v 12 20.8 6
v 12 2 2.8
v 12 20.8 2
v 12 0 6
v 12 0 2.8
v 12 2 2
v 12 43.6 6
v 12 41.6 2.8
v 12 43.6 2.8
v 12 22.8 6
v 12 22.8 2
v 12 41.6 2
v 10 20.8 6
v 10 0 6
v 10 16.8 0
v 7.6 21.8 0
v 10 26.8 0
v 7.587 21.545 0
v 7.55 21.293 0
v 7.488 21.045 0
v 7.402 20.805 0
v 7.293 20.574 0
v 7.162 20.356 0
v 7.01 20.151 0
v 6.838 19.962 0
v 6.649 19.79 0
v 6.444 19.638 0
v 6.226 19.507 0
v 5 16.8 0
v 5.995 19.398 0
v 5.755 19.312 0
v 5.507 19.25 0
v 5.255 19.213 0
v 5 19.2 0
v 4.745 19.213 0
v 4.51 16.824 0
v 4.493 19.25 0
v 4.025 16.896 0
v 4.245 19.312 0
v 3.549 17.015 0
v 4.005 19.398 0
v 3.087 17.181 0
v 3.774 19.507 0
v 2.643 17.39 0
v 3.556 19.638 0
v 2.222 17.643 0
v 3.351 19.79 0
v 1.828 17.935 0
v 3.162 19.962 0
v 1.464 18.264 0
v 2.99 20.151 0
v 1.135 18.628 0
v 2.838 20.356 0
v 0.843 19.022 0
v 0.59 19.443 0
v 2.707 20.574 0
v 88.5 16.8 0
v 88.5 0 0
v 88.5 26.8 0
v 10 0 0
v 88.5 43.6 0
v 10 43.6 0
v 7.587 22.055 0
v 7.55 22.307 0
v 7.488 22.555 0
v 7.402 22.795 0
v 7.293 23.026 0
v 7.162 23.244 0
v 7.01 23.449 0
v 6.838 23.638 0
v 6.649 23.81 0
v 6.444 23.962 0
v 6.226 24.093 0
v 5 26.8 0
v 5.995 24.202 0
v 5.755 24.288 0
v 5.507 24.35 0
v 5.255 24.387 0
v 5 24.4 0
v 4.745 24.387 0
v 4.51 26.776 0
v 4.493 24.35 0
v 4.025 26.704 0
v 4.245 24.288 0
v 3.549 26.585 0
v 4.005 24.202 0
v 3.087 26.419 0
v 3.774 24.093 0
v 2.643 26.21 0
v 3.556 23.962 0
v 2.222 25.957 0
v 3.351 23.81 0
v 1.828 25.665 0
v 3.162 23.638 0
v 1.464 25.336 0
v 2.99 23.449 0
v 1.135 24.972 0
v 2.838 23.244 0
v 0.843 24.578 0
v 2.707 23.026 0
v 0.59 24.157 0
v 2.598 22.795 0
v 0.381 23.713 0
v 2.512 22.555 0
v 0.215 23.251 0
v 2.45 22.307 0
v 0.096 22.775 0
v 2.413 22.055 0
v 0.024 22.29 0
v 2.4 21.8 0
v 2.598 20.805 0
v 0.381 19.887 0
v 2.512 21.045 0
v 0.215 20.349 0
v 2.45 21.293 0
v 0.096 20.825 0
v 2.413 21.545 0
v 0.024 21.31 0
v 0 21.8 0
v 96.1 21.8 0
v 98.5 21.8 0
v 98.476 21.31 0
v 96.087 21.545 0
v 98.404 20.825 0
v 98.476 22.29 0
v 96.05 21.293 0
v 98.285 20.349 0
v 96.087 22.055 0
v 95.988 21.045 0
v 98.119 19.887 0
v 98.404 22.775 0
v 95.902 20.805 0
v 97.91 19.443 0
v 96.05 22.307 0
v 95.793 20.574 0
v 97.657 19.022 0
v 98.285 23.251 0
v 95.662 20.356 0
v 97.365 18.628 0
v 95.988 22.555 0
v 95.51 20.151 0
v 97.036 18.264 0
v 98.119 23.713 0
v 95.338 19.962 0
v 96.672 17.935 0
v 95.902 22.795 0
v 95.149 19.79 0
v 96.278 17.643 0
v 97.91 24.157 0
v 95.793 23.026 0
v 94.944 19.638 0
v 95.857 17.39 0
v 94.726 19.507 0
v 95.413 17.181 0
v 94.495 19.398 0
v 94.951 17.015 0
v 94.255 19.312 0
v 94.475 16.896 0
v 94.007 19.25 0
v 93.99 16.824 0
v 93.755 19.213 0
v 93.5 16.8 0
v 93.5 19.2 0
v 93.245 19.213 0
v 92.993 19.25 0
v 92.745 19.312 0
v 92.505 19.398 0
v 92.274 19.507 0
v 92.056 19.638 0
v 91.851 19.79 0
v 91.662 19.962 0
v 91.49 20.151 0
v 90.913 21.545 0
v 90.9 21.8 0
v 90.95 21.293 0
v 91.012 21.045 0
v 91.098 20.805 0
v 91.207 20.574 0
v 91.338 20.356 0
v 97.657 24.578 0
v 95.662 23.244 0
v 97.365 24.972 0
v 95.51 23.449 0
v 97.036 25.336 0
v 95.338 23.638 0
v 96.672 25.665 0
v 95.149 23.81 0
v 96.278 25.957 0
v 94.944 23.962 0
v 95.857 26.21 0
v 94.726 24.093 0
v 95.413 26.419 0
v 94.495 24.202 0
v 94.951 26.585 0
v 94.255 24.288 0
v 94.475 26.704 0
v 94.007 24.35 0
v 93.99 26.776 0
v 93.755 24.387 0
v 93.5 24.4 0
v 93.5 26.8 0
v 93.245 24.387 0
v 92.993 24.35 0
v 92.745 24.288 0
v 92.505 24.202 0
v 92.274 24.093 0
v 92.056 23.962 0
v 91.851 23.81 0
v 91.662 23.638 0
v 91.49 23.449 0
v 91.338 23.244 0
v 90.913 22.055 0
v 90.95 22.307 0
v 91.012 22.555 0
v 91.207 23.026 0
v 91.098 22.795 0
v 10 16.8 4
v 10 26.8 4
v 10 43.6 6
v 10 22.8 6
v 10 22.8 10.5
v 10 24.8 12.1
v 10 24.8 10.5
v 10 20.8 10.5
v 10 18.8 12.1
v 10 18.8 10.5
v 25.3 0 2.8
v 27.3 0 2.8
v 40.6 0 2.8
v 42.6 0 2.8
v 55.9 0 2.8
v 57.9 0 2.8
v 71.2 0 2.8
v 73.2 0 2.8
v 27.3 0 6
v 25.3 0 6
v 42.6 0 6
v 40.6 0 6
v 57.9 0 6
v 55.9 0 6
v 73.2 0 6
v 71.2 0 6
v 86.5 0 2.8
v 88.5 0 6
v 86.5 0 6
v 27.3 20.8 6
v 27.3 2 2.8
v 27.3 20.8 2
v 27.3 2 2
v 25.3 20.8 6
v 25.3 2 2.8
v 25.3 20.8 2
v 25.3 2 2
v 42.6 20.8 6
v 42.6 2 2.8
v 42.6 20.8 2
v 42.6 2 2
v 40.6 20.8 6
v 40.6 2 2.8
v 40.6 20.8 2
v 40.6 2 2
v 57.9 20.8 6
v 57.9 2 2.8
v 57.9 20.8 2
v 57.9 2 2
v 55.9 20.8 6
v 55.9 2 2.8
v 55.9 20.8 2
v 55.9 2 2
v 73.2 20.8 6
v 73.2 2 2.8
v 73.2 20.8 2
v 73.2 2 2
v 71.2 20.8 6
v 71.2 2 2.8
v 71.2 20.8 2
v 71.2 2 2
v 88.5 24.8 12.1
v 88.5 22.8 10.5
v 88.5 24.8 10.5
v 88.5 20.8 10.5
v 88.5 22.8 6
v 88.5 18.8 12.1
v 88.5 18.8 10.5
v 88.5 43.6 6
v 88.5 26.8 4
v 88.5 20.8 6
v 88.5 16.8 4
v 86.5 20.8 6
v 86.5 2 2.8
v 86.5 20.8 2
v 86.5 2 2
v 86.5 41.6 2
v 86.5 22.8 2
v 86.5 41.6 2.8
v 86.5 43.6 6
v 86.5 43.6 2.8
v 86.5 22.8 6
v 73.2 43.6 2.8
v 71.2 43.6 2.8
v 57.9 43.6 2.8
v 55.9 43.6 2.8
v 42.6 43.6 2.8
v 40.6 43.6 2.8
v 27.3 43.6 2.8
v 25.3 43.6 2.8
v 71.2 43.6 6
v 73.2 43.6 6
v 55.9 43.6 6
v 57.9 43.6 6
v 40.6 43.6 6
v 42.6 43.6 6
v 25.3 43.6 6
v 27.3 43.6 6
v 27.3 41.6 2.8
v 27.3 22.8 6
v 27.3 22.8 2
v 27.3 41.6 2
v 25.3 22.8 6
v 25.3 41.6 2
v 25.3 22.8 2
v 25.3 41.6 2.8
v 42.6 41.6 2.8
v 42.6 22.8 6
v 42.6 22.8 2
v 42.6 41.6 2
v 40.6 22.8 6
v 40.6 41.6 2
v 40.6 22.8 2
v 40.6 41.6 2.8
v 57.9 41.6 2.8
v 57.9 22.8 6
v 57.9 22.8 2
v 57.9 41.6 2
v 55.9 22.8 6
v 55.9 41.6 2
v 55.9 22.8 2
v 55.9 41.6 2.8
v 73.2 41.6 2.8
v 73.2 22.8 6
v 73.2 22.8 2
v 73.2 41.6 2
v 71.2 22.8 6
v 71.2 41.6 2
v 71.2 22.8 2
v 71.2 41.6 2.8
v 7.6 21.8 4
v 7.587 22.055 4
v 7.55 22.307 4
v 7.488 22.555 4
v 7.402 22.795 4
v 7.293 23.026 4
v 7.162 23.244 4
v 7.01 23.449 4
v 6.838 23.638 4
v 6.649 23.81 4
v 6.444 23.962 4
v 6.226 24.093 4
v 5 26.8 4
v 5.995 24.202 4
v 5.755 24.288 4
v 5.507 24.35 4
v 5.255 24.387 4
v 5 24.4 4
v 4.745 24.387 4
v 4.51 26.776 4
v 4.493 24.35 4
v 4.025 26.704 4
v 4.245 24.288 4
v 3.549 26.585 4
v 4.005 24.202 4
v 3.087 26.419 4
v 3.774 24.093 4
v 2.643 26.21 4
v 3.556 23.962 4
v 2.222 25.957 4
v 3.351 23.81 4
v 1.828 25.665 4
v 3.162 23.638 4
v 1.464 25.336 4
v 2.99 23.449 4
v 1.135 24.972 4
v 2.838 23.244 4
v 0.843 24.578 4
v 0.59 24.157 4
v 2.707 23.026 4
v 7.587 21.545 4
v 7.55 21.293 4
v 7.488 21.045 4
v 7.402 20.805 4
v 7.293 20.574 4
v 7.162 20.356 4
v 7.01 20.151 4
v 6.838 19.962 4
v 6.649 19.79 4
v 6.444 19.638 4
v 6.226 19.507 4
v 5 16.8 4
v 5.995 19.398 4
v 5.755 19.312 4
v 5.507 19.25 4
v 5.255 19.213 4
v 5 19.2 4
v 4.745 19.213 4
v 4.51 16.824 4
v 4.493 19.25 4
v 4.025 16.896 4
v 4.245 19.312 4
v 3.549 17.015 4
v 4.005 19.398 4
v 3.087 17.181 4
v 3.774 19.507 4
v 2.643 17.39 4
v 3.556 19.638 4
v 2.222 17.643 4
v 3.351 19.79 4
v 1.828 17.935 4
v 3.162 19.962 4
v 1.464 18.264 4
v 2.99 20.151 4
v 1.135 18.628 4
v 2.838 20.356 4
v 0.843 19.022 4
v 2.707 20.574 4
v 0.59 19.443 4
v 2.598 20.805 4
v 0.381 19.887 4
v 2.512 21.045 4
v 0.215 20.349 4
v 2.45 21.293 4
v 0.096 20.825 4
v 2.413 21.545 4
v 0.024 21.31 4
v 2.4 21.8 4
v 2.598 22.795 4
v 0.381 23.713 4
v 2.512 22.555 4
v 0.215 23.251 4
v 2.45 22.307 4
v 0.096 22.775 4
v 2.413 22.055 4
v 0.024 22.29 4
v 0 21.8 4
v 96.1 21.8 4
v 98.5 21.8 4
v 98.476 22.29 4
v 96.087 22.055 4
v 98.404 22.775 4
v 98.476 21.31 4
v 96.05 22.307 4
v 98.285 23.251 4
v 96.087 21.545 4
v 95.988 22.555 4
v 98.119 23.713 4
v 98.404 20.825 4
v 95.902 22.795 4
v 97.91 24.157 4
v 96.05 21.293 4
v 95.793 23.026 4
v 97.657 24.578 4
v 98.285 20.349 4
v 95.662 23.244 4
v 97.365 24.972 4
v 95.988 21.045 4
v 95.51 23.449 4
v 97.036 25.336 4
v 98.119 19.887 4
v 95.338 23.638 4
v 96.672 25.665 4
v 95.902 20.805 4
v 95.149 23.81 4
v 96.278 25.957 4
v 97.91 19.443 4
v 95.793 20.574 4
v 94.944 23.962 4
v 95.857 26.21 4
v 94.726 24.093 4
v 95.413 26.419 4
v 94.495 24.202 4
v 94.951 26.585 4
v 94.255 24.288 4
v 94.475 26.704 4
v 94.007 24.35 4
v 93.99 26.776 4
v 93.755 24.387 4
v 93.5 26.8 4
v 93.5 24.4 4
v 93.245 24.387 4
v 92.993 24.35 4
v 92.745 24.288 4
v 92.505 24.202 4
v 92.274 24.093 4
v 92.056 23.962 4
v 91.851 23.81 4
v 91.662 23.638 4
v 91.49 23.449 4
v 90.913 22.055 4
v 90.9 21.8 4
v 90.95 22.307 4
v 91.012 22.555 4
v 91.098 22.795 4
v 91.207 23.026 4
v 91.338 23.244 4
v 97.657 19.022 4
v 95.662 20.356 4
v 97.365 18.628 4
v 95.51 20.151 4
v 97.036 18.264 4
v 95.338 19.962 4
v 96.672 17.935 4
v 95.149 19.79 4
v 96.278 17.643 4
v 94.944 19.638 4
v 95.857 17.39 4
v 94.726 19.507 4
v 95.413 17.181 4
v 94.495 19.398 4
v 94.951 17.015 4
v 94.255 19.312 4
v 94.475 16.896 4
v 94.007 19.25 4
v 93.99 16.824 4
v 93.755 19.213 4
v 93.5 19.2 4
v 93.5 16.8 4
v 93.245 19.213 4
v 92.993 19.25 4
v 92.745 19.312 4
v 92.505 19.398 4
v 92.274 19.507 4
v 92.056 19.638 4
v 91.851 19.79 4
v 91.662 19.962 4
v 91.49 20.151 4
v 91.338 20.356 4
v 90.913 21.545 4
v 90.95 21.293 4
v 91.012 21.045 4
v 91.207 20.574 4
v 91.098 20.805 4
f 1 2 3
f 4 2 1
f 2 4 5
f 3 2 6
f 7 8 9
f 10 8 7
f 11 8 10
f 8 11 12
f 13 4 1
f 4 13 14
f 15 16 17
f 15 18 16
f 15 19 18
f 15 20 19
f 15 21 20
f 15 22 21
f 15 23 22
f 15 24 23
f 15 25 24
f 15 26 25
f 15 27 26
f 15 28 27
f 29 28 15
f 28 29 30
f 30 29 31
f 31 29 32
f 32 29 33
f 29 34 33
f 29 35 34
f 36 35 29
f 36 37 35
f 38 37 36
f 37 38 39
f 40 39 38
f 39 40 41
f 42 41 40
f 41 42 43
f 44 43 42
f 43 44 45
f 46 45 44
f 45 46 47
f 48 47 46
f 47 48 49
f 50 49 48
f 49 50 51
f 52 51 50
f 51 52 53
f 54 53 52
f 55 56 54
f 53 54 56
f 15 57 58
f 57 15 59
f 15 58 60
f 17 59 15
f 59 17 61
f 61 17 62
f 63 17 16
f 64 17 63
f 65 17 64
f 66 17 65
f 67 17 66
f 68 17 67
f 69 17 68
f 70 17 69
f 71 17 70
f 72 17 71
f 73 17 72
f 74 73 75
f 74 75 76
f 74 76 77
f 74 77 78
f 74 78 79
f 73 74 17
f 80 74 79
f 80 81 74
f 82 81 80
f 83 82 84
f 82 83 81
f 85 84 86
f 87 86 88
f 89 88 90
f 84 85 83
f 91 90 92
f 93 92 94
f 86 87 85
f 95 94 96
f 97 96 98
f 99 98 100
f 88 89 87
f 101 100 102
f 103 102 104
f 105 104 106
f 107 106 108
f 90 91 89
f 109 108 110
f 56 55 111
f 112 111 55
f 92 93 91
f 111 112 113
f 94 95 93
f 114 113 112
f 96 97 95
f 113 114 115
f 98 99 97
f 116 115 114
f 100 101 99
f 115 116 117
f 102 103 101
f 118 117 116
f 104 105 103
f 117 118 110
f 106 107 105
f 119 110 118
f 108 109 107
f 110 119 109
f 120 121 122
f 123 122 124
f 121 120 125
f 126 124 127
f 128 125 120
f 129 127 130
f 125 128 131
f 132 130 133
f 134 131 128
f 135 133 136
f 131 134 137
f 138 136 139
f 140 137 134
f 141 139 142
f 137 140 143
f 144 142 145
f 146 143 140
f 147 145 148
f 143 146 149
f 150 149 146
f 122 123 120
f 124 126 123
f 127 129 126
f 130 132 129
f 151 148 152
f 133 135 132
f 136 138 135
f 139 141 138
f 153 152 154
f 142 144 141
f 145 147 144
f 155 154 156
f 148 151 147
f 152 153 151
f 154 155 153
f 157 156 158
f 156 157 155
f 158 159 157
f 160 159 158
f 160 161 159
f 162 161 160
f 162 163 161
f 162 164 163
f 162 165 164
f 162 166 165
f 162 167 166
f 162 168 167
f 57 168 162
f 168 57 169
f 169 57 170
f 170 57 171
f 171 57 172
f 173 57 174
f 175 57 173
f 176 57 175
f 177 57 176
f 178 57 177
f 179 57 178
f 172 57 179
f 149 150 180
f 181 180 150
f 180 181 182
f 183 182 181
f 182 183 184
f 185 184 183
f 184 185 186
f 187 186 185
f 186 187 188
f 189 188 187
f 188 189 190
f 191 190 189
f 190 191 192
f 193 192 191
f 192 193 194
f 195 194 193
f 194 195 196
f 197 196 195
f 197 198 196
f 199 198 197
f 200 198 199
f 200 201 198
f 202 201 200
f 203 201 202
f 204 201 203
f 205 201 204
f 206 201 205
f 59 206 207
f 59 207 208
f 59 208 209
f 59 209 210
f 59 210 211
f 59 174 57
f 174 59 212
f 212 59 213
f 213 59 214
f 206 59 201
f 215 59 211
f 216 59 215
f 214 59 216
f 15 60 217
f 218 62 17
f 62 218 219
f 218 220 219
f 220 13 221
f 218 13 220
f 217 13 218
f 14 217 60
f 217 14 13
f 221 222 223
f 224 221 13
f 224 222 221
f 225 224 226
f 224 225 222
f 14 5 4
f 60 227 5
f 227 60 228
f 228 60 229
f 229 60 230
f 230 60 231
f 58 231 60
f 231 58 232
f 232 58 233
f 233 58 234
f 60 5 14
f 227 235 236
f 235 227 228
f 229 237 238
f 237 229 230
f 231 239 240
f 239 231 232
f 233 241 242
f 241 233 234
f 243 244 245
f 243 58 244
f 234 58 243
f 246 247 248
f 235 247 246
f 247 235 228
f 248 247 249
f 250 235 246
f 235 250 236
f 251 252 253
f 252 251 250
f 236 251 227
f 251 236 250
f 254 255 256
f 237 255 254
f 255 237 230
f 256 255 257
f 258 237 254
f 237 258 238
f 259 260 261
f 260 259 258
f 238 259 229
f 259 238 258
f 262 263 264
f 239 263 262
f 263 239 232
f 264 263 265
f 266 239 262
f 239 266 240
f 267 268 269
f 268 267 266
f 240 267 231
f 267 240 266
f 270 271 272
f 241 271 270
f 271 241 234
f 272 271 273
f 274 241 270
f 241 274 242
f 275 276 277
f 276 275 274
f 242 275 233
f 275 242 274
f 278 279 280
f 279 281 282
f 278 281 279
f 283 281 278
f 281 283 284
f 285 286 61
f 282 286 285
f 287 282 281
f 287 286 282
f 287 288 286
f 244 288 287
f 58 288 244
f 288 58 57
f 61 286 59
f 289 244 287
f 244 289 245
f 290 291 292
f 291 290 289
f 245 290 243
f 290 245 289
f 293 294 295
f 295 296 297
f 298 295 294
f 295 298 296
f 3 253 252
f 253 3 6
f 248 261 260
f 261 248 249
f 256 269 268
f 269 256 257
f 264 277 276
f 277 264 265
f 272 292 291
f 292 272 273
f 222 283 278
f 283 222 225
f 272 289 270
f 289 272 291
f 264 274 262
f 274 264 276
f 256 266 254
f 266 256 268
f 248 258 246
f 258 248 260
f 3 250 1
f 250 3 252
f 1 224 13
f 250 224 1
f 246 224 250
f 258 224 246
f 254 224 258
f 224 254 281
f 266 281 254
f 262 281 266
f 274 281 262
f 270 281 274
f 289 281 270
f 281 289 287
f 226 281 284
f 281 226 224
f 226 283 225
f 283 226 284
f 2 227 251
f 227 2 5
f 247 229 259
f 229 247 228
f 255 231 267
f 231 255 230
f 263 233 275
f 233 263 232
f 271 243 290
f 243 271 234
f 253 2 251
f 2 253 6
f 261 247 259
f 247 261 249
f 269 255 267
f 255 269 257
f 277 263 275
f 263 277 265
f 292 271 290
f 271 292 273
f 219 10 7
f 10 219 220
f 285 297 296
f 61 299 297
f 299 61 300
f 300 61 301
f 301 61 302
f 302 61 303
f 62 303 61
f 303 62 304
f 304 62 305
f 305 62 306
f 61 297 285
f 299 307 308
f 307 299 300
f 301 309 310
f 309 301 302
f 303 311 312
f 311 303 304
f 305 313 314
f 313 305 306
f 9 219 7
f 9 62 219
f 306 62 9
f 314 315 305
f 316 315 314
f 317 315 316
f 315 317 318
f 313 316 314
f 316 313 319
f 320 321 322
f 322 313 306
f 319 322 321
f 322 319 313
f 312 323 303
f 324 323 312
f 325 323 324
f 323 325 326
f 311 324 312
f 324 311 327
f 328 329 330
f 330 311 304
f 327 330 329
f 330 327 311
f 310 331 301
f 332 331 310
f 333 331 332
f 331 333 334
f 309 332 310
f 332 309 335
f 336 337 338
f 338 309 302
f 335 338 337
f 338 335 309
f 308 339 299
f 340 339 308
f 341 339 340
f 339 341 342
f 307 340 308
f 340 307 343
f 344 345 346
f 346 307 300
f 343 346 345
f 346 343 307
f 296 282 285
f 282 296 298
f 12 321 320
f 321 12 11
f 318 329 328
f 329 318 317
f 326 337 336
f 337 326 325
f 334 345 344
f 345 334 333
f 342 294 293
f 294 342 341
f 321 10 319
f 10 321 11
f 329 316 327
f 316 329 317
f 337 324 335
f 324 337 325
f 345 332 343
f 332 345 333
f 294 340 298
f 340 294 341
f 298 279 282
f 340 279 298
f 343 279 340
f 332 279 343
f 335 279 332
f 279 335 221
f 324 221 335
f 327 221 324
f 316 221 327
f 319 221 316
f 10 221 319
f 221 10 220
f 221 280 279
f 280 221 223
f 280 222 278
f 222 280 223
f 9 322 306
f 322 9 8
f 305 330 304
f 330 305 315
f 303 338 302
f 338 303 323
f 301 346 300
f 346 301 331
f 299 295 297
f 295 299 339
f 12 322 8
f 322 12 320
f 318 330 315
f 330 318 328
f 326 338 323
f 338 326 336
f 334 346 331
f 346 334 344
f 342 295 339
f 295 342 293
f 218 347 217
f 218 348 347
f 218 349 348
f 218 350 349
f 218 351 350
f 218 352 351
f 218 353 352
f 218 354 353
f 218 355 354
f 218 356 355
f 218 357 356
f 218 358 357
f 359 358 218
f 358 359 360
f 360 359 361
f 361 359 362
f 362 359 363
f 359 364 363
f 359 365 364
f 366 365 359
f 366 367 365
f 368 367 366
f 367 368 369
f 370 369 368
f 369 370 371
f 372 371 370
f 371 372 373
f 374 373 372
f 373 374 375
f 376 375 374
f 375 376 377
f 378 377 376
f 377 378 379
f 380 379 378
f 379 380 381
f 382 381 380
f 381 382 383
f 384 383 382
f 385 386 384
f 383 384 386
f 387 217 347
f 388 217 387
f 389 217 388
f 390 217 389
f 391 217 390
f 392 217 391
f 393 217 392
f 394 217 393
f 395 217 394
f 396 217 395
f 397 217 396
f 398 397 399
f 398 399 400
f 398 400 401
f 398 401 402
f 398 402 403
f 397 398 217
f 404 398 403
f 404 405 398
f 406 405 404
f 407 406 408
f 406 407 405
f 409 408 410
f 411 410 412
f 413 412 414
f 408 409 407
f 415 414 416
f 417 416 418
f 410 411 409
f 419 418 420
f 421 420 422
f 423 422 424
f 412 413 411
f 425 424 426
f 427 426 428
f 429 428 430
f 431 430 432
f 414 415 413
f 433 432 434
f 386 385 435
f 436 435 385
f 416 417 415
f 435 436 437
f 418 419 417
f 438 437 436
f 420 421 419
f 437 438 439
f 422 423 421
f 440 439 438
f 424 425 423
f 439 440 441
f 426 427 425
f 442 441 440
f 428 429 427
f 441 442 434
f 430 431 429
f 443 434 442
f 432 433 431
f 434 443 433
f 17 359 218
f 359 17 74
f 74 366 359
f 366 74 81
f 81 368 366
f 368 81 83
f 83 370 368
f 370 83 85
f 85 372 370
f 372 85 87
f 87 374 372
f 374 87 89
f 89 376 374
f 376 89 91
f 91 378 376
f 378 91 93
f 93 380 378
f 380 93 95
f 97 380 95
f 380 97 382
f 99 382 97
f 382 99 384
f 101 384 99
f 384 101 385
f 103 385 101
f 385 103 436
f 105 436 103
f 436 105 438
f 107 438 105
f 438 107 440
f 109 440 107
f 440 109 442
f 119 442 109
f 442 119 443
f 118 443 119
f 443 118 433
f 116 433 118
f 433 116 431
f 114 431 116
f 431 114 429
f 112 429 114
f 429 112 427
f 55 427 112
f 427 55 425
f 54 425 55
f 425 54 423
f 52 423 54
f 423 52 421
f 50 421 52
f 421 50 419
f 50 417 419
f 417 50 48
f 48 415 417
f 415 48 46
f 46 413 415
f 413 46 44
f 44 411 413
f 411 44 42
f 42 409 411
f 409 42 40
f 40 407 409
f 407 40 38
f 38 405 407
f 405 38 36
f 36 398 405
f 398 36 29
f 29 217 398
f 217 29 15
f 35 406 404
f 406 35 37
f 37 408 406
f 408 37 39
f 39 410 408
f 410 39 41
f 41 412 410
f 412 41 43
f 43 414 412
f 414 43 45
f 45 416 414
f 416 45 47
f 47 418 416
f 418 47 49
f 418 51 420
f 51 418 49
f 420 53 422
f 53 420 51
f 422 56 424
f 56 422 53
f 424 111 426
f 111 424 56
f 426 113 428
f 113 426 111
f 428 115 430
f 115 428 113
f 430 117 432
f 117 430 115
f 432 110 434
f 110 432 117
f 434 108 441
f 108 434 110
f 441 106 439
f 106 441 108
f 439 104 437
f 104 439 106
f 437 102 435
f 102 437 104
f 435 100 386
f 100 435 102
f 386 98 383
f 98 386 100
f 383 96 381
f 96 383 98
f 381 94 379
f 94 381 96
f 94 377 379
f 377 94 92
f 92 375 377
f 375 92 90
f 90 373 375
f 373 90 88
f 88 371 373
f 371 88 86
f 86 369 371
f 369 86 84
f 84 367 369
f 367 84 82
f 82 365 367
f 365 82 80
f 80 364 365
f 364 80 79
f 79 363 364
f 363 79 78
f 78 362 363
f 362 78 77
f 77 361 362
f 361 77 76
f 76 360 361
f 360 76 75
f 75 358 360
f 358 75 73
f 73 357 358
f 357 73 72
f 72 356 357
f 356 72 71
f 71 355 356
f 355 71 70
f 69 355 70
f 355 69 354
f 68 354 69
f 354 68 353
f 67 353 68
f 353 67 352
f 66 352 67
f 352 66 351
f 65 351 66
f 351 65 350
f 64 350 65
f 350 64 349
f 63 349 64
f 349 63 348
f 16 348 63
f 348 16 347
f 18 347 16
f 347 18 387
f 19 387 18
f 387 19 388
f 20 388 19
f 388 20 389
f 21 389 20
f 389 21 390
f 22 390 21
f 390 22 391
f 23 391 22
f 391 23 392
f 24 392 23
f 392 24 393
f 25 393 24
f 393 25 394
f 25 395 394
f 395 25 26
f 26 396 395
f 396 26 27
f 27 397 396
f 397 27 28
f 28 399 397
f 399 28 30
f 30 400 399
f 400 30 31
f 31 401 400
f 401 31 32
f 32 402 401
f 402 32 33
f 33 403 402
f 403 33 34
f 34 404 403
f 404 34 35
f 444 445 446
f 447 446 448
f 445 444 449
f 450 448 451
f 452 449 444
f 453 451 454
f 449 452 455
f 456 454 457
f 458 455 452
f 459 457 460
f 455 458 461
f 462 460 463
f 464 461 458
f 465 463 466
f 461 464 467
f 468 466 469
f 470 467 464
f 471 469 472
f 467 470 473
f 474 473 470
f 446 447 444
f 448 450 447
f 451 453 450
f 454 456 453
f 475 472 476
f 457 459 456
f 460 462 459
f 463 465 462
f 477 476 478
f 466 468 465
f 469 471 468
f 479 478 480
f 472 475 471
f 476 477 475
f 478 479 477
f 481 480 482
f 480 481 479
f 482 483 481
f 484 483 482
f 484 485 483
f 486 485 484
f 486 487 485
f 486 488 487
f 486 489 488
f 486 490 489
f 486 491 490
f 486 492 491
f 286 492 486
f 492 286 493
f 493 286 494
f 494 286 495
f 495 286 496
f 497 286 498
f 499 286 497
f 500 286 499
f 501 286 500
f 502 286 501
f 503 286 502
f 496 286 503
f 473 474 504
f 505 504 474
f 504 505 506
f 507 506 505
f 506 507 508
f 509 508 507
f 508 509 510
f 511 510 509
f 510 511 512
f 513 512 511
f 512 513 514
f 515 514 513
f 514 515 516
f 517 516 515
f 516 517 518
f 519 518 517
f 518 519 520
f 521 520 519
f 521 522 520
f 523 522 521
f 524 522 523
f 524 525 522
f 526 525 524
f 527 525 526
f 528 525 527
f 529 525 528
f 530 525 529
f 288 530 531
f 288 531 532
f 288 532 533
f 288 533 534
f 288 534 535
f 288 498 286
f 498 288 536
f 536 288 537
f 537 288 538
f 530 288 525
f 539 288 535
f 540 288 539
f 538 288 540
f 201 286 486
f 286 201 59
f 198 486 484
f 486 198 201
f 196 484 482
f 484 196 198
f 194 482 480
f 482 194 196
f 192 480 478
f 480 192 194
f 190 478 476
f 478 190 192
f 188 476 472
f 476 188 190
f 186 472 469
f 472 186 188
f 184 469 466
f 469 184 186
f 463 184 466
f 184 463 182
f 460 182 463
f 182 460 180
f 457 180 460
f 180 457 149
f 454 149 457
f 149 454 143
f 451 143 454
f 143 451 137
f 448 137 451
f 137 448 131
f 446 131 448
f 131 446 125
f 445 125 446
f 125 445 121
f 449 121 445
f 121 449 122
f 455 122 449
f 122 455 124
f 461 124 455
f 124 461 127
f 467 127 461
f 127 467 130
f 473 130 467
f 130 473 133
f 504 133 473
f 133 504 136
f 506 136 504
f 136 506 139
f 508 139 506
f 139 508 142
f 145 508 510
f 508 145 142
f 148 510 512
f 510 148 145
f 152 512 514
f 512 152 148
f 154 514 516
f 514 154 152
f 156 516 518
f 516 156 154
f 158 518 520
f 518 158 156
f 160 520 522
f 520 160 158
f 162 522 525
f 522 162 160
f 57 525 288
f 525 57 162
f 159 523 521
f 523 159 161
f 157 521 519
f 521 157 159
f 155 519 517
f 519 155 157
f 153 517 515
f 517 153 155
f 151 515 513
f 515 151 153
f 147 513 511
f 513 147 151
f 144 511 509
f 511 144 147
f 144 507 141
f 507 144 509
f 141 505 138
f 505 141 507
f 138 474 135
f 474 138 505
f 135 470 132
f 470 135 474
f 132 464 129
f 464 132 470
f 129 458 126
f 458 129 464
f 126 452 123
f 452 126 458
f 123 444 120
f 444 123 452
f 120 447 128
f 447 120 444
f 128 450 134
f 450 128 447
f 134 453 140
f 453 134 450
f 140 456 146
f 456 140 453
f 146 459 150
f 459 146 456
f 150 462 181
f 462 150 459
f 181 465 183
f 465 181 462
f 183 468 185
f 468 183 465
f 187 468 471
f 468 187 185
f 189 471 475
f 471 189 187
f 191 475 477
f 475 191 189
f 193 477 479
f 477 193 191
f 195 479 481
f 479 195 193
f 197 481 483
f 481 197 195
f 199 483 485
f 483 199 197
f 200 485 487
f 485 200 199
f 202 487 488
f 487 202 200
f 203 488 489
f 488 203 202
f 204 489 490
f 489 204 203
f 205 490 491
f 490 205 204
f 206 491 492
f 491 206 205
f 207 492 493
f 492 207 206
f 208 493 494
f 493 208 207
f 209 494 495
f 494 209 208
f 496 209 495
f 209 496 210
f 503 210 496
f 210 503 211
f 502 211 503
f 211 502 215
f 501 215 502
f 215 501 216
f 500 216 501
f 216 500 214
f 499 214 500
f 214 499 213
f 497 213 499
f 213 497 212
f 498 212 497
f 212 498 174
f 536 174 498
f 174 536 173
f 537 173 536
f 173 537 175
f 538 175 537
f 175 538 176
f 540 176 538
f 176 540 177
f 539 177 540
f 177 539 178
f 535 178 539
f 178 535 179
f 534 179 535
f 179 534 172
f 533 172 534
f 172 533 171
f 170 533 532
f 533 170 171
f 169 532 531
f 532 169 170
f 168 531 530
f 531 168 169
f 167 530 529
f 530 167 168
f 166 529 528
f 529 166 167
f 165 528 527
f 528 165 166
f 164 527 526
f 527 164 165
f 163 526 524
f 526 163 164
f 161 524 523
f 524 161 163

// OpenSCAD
// Lever-nut holder: a printable tray for WAGO 221 lever connectors, one slot
// per connector, in one row or two back to back, lying flat or standing up,
// with a screw tab at each end. MIT licence; see LICENSE.

/* [Holder] */

// Conductors per connector, one entry per slot: 2, 3 or 5 for the 221-412, 221-413 and 221-415
blocks_config = [2, 2, 2, 2, 2];

// One row or two back to back, lying flat (wires leave sideways) or standing up (wires leave upward)
style_config = "horizontal_mirrored"; // [horizontal, horizontal_mirrored, vertical, vertical_mirrored]

/* [Screw tabs] */

tabs = true;

// Length and width of each tab, mm
tab_width = 10;

// Radius of the screw hole, mm
tab_radius = 2.6;

// Thickness of each tab, mm
tab_height = 4;

/* [Fit] */

// Clearance added to the connector's width, depth and height, mm
allowance = 0.2;

/* [Hidden] */

// "holder", or for the checks: "fit" (the holder where it meets connectors at
// datasheet size; empty when they fit) and "grip" (where it meets connectors
// 1 mm taller; the lips that hold them down)
part = "holder";

$fn = $preview ? 32 : 64;

// WAGO 221 sizes from its datasheets, mm. The width grows 5.6 mm per
// conductor: 13.1 for the 221-412, 18.7 for the 221-413, 29.9 for the 221-415.
function connector_width(n) = 1.9 + 5.6 * n;
connector_depth = 18.6;
connector_height = 8.3;

wall = 2;        // rails and back wall
floor_t = 2;     // under the connectors
lip_t = 1.6;     // thickness of the lip over the back edge
back_lip = 2;    // how far the lip reaches over the connector
front_stop = 0.8; // height of the front stop above the floor
rail = 4;        // height of the side rails above the floor

STYLES = ["horizontal", "horizontal_mirrored", "vertical", "vertical_mirrored"];

function slot_width(n, a) = connector_width(n) + a;
// x of slot i's left side, and the row's length with a rail at each end.
function slot_x(blocks, a, i) =
  i == 0 ? wall : slot_x(blocks, a, i - 1) + slot_width(blocks[i - 1], a) + wall;
function row_length(blocks, a) = slot_x(blocks, a, len(blocks));

// One row, front at y = 0, back wall at y = depth, floor at z = 0.
module row(blocks, a) {
  d = connector_depth + a;
  h = connector_height + a;
  length = row_length(blocks, a);
  translate([0, -wall, 0]) cube([length, d + 2 * wall, floor_t]);
  translate([0, d, 0]) cube([length, wall, floor_t + h + lip_t]);
  translate([0, d - back_lip, floor_t + h]) cube([length, back_lip + wall, lip_t]);
  translate([0, -wall, 0]) cube([length, wall, floor_t + front_stop]);
  for (i = [0:len(blocks)])
    translate([slot_x(blocks, a, i) - wall, -wall, 0])
      cube([wall, d + 2 * wall, floor_t + rail]);
}

// Connectors at datasheet size in a row's slots, optionally made taller. They
// are 0.01 mm smaller on every face, so resting on the floor doesn't count as
// meeting the holder.
module connectors(blocks, a, grow = 0) {
  e = 0.01;
  for (i = [0:len(blocks) - 1])
    translate([slot_x(blocks, a, i) + a / 2 + e, a / 2 + e, floor_t + e])
      cube([connector_width(blocks[i]) - 2 * e, connector_depth - 2 * e, connector_height + grow - 2 * e]);
}

// Places its child, a row, in the chosen style, with the part on z = 0 and
// starting at x = 0, y = 0. Adds the screw tabs when asked.
module arrange(blocks, style, a, tabs, tab_width, tab_radius, tab_height, with_tabs) {
  d = connector_depth + a;
  h = floor_t + connector_height + a + lip_t;
  length = row_length(blocks, a);
  shift = tabs ? tab_width : 0;
  upright = style == "vertical" || style == "vertical_mirrored";
  double = style == "horizontal_mirrored" || style == "vertical_mirrored";
  // Where the tabs' centres sit across the part.
  tab_y =
    !upright ? (double ? d + 1.5 * wall : (d + 2 * wall) / 2)
    : (double ? h - floor_t / 2 : h / 2);

  translate([shift, 0, 0]) {
    if (!upright) {
      translate([0, wall, 0]) {
        children();
        // The second row turns about the back wall, so the two share it.
        if (double) translate([0, 2 * d + wall, 0]) mirror([0, 1, 0]) children();
      }
    } else {
      // Standing on the back wall: the floor is upright and wires leave upward.
      lift = double ? h - floor_t : 0;
      translate([0, lift, d + wall]) {
        rotate([-90, 0, 0]) children();
        // The second row turns about the floor, so the two share it.
        if (double) translate([0, floor_t, 0]) mirror([0, 1, 0]) rotate([-90, 0, 0]) children();
      }
    }
    if (tabs && with_tabs) {
      translate([0, tab_y, 0]) tab(tab_width, tab_radius, tab_height);
      translate([length, tab_y, 0]) mirror([1, 0, 0]) tab(tab_width, tab_radius, tab_height);
    }
  }
}

// A screw tab reaching out from x = 0 towards -x, centred on y = 0. It runs
// under the end rail so it joins the row.
module tab(width, radius, thickness) {
  linear_extrude(thickness) difference() {
    hull() {
      translate([-width / 2, 0]) circle(d = width);
      translate([-width / 2, -width / 2]) square([width / 2 + wall, width]);
    }
    translate([-width / 2, 0]) circle(r = radius);
  }
}

module lever_nut_holder(
  blocks = [2, 2, 2, 2, 2],
  style = "horizontal_mirrored",
  tabs = true,
  tab_width = 10,
  tab_radius = 2.6,
  tab_height = 4,
  allowance = 0.2
) {
  assert(len(blocks) > 0, "lever_nut_holder: blocks needs at least one connector");
  assert(len([for (n = blocks) if (n != floor(n) || n < 1) n]) == 0,
         str("lever_nut_holder: each entry in blocks is a whole number of conductors, got ", blocks));
  assert(len([for (s = STYLES) if (s == style) s]) == 1,
         str("lever_nut_holder: style is one of ", STYLES, ", got ", style));
  assert(!tabs || tab_radius < tab_width / 2,
         "lever_nut_holder: tab_radius has to be less than half of tab_width");
  arrange(blocks, style, allowance, tabs, tab_width, tab_radius, tab_height, true)
    row(blocks, allowance);
}

module checked_part(grow) {
  intersection() {
    lever_nut_holder(blocks_config, style_config, tabs, tab_width, tab_radius, tab_height, allowance);
    arrange(blocks_config, style_config, allowance, tabs, tab_width, tab_radius, tab_height, false)
      connectors(blocks_config, allowance, grow);
  }
}

if (part == "fit") checked_part(0);
else if (part == "grip") checked_part(1);
else lever_nut_holder(blocks_config, style_config, tabs, tab_width, tab_radius, tab_height, allowance);
